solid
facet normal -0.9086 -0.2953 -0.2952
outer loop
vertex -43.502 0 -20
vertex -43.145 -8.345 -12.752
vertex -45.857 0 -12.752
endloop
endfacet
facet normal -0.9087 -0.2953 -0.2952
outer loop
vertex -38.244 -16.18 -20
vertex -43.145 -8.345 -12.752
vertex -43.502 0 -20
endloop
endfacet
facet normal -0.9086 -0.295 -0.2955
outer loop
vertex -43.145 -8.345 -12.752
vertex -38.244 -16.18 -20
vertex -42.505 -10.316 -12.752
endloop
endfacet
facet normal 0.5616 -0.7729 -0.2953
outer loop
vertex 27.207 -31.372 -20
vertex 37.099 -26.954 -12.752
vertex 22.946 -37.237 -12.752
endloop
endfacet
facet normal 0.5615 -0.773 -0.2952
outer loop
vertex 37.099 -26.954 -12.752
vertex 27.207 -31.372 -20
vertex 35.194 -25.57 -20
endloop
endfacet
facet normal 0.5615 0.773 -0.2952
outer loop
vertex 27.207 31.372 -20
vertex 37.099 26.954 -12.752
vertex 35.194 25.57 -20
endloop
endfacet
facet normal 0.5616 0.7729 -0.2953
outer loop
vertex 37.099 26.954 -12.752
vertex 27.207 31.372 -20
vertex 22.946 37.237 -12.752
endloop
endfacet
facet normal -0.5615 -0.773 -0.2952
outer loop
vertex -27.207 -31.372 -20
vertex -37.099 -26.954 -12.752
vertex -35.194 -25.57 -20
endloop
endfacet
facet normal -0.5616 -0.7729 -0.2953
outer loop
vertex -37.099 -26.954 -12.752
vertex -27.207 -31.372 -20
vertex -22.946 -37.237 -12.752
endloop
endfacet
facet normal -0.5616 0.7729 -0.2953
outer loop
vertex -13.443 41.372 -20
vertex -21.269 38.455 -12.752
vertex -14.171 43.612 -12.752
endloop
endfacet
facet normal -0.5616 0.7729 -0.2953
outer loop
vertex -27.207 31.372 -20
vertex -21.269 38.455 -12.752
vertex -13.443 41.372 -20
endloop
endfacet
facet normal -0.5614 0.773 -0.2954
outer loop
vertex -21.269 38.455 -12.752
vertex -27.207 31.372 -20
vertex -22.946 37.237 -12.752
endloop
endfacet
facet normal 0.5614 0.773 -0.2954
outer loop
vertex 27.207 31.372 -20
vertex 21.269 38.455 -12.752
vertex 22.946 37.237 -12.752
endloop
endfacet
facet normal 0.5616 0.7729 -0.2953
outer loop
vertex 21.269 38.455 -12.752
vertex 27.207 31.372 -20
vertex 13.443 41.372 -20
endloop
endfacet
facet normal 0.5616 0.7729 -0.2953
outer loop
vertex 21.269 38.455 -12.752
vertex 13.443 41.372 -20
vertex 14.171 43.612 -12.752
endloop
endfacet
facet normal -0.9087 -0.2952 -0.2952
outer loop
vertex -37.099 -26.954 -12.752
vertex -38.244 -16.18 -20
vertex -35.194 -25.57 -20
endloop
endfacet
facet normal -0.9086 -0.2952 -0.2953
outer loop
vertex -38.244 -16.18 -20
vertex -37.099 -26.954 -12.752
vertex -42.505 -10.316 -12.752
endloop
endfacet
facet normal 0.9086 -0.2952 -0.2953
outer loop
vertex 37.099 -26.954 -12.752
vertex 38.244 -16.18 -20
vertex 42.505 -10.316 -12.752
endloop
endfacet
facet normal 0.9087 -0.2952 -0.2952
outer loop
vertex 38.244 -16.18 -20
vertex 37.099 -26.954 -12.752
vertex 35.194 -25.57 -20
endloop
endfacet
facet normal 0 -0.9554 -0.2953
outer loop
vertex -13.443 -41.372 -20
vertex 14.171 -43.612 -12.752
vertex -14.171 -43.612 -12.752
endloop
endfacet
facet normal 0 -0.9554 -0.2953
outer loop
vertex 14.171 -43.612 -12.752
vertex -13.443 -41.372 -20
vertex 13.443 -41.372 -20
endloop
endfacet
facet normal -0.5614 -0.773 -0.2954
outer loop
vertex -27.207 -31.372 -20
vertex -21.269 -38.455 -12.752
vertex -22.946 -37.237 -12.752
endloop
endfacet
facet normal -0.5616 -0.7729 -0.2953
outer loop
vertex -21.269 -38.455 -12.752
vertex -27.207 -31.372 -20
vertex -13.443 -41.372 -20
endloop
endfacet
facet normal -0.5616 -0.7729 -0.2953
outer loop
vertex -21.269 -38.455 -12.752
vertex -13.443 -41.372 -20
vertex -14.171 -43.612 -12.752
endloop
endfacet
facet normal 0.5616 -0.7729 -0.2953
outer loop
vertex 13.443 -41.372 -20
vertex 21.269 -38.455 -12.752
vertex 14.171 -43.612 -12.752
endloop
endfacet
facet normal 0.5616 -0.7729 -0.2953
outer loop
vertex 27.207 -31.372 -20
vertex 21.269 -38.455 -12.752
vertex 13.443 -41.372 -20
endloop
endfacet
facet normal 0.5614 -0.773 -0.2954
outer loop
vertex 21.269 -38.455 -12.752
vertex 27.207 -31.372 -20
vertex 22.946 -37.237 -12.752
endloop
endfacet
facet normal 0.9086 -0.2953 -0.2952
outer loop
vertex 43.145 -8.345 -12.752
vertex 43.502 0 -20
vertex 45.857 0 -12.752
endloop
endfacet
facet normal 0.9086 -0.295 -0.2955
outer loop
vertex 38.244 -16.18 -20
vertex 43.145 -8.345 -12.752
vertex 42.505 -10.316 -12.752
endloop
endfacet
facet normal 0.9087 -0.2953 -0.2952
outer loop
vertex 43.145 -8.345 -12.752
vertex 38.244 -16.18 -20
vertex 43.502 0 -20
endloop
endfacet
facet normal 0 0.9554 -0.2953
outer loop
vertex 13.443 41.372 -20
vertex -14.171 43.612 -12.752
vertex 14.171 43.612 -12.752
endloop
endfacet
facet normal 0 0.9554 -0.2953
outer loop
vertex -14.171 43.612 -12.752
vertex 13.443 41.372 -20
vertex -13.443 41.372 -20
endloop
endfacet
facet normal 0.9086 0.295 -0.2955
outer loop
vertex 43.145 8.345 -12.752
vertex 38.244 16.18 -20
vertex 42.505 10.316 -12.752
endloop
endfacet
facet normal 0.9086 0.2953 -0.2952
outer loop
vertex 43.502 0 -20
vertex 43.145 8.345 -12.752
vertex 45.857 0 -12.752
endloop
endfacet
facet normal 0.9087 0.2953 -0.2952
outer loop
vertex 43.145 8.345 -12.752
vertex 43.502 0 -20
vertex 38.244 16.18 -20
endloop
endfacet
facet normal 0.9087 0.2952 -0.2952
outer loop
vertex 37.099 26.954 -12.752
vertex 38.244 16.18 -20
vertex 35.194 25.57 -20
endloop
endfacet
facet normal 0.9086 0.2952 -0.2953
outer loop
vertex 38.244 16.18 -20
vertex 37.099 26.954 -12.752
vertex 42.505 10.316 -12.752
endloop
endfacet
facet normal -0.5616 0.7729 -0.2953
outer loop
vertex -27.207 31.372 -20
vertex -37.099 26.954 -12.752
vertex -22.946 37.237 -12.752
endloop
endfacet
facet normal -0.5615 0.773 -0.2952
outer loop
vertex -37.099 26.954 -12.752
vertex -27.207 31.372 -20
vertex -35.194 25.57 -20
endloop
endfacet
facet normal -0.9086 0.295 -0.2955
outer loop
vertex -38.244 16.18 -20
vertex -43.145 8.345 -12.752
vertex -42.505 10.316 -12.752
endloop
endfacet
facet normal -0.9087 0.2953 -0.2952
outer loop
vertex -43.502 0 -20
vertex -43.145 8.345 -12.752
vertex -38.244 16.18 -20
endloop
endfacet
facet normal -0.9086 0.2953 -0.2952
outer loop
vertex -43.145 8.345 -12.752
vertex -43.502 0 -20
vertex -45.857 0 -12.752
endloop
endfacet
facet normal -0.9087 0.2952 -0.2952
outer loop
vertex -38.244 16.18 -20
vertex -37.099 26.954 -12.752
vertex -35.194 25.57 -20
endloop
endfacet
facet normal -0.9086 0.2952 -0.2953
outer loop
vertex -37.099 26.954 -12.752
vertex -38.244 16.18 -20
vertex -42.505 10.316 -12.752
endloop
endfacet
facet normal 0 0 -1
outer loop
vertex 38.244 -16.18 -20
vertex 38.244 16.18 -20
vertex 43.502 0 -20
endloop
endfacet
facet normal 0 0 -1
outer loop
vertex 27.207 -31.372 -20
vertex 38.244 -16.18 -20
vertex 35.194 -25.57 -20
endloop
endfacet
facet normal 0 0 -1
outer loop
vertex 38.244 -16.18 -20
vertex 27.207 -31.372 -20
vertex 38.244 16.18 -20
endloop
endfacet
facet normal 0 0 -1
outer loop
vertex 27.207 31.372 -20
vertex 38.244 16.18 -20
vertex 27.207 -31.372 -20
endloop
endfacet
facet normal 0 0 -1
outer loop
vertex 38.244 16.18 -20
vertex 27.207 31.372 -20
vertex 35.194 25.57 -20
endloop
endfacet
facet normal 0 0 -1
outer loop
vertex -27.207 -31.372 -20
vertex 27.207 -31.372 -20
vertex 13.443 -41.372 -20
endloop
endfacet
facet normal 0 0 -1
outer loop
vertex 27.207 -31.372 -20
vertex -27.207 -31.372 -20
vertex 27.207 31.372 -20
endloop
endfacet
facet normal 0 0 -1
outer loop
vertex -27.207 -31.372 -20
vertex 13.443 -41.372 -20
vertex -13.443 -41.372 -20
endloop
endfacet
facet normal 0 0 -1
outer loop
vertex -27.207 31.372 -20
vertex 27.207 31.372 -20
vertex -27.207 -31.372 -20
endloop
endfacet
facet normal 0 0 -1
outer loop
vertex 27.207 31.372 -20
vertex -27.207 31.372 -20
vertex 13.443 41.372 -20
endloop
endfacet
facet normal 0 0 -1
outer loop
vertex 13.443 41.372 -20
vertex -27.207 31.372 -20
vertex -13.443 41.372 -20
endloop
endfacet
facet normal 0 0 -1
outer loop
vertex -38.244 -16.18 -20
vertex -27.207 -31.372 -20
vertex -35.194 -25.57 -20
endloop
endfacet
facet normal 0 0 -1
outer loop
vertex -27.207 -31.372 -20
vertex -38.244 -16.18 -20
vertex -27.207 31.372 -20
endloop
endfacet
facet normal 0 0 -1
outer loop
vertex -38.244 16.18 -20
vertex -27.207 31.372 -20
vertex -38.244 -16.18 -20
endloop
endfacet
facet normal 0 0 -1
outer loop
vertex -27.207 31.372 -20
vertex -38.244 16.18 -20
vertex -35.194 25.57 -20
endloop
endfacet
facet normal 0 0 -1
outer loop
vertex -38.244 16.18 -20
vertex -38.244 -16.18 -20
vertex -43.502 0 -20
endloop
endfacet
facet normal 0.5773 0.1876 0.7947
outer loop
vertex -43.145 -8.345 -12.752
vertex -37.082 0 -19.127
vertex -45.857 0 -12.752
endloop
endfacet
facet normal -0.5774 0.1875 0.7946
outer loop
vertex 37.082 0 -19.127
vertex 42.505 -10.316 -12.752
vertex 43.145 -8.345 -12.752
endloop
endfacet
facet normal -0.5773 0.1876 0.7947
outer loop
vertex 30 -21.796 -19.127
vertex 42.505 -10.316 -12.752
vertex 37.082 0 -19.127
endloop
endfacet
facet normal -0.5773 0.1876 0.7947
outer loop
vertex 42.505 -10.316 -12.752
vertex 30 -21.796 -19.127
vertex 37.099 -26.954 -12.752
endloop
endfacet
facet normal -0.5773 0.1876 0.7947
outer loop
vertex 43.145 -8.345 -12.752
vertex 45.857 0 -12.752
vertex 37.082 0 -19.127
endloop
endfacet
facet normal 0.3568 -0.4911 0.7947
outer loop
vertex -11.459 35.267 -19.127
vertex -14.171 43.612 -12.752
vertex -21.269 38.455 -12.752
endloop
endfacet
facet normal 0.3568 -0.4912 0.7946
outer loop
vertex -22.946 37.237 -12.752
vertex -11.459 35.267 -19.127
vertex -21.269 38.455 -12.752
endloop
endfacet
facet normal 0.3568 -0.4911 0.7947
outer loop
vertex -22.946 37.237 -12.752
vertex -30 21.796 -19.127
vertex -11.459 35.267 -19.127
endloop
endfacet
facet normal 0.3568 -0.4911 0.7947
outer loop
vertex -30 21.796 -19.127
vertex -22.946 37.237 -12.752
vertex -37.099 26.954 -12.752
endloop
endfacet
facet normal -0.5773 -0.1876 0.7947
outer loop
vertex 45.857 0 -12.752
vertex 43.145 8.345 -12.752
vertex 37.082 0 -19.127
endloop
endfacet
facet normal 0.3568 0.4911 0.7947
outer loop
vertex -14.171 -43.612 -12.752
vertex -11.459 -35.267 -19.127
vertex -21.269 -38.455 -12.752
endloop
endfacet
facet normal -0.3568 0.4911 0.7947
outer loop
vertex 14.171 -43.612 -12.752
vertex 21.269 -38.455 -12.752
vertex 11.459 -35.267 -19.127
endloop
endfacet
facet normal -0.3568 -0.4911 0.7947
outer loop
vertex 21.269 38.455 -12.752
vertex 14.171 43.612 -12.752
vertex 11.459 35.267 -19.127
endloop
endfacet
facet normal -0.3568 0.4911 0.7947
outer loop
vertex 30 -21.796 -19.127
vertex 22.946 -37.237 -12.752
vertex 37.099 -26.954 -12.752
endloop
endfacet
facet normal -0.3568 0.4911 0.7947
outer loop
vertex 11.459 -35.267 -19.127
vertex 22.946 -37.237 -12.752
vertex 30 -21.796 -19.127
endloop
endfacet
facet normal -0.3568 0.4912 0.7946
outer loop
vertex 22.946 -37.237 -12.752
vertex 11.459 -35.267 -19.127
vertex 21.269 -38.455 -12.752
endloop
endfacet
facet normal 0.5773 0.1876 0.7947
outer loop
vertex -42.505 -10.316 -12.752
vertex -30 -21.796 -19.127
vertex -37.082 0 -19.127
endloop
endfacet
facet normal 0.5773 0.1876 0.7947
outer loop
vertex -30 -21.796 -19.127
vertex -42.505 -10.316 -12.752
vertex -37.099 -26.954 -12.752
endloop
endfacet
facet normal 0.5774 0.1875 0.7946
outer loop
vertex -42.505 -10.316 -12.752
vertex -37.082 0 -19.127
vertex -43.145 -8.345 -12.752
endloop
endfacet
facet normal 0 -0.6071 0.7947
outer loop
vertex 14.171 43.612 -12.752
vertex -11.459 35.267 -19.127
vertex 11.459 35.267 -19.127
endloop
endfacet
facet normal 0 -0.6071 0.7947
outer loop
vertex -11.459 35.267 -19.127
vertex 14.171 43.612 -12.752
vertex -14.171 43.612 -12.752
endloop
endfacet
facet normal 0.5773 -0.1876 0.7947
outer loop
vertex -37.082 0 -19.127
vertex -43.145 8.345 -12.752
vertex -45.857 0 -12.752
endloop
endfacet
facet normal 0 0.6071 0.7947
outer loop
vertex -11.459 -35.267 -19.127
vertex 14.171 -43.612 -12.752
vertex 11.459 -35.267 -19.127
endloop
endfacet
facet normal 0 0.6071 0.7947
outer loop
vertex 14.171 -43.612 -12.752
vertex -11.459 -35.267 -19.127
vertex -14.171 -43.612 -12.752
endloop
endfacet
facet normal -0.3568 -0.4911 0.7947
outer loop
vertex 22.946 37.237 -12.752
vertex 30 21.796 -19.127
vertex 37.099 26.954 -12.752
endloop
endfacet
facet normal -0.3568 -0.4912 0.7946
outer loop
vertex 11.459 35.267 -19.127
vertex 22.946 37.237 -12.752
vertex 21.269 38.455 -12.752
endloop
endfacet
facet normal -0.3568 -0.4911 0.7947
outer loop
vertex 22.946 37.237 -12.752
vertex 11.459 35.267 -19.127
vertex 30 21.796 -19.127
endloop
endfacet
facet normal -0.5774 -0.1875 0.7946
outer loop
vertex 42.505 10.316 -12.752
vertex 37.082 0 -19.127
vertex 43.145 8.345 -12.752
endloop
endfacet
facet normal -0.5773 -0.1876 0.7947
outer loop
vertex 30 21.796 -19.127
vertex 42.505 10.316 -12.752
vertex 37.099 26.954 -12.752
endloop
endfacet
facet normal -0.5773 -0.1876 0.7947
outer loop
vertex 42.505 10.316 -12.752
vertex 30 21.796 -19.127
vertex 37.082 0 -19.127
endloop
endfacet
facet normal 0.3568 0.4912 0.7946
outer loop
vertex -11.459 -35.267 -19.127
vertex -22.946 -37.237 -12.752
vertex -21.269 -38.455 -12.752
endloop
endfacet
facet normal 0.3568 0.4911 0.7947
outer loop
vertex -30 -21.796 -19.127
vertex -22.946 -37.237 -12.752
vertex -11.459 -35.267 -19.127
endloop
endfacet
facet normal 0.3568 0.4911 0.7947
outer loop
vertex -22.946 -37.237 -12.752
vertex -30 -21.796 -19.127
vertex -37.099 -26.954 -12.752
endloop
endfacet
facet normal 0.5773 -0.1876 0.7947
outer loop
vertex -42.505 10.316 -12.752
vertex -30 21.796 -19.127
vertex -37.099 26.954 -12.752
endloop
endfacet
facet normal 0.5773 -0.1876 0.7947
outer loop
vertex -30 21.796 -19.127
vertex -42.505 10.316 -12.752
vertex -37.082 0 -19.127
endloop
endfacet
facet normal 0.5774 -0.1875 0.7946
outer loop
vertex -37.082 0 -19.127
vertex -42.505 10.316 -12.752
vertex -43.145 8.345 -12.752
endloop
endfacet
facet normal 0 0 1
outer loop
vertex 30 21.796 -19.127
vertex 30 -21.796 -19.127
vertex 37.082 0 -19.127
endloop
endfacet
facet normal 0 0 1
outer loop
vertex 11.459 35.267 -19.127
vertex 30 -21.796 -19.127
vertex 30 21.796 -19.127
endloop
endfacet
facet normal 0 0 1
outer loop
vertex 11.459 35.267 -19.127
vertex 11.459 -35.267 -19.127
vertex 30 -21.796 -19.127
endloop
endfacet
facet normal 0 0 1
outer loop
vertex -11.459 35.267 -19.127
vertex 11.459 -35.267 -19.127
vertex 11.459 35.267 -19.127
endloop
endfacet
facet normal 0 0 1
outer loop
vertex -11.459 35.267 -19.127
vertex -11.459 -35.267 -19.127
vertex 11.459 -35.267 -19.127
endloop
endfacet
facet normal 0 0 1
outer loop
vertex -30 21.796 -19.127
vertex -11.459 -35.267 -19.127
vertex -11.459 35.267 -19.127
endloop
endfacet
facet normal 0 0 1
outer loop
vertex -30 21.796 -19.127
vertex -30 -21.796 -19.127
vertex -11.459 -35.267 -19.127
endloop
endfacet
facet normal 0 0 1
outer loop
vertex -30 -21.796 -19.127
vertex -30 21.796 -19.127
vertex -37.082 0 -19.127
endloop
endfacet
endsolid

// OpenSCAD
//Outside Sphere Diameter
OD=50;//[45:60]
//Inside Sphere Diameter
ID=120;//[95:120]
//min/max:[95:115];

difference(){
difference(){
sphere(OD,$fn=10);

//to make the bottom flat
translate([0,0,-50])
cube([200,200,60],center=true);
}
//To make inside of plate
translate([0,0,95])
sphere(ID,$fn=10);
}
